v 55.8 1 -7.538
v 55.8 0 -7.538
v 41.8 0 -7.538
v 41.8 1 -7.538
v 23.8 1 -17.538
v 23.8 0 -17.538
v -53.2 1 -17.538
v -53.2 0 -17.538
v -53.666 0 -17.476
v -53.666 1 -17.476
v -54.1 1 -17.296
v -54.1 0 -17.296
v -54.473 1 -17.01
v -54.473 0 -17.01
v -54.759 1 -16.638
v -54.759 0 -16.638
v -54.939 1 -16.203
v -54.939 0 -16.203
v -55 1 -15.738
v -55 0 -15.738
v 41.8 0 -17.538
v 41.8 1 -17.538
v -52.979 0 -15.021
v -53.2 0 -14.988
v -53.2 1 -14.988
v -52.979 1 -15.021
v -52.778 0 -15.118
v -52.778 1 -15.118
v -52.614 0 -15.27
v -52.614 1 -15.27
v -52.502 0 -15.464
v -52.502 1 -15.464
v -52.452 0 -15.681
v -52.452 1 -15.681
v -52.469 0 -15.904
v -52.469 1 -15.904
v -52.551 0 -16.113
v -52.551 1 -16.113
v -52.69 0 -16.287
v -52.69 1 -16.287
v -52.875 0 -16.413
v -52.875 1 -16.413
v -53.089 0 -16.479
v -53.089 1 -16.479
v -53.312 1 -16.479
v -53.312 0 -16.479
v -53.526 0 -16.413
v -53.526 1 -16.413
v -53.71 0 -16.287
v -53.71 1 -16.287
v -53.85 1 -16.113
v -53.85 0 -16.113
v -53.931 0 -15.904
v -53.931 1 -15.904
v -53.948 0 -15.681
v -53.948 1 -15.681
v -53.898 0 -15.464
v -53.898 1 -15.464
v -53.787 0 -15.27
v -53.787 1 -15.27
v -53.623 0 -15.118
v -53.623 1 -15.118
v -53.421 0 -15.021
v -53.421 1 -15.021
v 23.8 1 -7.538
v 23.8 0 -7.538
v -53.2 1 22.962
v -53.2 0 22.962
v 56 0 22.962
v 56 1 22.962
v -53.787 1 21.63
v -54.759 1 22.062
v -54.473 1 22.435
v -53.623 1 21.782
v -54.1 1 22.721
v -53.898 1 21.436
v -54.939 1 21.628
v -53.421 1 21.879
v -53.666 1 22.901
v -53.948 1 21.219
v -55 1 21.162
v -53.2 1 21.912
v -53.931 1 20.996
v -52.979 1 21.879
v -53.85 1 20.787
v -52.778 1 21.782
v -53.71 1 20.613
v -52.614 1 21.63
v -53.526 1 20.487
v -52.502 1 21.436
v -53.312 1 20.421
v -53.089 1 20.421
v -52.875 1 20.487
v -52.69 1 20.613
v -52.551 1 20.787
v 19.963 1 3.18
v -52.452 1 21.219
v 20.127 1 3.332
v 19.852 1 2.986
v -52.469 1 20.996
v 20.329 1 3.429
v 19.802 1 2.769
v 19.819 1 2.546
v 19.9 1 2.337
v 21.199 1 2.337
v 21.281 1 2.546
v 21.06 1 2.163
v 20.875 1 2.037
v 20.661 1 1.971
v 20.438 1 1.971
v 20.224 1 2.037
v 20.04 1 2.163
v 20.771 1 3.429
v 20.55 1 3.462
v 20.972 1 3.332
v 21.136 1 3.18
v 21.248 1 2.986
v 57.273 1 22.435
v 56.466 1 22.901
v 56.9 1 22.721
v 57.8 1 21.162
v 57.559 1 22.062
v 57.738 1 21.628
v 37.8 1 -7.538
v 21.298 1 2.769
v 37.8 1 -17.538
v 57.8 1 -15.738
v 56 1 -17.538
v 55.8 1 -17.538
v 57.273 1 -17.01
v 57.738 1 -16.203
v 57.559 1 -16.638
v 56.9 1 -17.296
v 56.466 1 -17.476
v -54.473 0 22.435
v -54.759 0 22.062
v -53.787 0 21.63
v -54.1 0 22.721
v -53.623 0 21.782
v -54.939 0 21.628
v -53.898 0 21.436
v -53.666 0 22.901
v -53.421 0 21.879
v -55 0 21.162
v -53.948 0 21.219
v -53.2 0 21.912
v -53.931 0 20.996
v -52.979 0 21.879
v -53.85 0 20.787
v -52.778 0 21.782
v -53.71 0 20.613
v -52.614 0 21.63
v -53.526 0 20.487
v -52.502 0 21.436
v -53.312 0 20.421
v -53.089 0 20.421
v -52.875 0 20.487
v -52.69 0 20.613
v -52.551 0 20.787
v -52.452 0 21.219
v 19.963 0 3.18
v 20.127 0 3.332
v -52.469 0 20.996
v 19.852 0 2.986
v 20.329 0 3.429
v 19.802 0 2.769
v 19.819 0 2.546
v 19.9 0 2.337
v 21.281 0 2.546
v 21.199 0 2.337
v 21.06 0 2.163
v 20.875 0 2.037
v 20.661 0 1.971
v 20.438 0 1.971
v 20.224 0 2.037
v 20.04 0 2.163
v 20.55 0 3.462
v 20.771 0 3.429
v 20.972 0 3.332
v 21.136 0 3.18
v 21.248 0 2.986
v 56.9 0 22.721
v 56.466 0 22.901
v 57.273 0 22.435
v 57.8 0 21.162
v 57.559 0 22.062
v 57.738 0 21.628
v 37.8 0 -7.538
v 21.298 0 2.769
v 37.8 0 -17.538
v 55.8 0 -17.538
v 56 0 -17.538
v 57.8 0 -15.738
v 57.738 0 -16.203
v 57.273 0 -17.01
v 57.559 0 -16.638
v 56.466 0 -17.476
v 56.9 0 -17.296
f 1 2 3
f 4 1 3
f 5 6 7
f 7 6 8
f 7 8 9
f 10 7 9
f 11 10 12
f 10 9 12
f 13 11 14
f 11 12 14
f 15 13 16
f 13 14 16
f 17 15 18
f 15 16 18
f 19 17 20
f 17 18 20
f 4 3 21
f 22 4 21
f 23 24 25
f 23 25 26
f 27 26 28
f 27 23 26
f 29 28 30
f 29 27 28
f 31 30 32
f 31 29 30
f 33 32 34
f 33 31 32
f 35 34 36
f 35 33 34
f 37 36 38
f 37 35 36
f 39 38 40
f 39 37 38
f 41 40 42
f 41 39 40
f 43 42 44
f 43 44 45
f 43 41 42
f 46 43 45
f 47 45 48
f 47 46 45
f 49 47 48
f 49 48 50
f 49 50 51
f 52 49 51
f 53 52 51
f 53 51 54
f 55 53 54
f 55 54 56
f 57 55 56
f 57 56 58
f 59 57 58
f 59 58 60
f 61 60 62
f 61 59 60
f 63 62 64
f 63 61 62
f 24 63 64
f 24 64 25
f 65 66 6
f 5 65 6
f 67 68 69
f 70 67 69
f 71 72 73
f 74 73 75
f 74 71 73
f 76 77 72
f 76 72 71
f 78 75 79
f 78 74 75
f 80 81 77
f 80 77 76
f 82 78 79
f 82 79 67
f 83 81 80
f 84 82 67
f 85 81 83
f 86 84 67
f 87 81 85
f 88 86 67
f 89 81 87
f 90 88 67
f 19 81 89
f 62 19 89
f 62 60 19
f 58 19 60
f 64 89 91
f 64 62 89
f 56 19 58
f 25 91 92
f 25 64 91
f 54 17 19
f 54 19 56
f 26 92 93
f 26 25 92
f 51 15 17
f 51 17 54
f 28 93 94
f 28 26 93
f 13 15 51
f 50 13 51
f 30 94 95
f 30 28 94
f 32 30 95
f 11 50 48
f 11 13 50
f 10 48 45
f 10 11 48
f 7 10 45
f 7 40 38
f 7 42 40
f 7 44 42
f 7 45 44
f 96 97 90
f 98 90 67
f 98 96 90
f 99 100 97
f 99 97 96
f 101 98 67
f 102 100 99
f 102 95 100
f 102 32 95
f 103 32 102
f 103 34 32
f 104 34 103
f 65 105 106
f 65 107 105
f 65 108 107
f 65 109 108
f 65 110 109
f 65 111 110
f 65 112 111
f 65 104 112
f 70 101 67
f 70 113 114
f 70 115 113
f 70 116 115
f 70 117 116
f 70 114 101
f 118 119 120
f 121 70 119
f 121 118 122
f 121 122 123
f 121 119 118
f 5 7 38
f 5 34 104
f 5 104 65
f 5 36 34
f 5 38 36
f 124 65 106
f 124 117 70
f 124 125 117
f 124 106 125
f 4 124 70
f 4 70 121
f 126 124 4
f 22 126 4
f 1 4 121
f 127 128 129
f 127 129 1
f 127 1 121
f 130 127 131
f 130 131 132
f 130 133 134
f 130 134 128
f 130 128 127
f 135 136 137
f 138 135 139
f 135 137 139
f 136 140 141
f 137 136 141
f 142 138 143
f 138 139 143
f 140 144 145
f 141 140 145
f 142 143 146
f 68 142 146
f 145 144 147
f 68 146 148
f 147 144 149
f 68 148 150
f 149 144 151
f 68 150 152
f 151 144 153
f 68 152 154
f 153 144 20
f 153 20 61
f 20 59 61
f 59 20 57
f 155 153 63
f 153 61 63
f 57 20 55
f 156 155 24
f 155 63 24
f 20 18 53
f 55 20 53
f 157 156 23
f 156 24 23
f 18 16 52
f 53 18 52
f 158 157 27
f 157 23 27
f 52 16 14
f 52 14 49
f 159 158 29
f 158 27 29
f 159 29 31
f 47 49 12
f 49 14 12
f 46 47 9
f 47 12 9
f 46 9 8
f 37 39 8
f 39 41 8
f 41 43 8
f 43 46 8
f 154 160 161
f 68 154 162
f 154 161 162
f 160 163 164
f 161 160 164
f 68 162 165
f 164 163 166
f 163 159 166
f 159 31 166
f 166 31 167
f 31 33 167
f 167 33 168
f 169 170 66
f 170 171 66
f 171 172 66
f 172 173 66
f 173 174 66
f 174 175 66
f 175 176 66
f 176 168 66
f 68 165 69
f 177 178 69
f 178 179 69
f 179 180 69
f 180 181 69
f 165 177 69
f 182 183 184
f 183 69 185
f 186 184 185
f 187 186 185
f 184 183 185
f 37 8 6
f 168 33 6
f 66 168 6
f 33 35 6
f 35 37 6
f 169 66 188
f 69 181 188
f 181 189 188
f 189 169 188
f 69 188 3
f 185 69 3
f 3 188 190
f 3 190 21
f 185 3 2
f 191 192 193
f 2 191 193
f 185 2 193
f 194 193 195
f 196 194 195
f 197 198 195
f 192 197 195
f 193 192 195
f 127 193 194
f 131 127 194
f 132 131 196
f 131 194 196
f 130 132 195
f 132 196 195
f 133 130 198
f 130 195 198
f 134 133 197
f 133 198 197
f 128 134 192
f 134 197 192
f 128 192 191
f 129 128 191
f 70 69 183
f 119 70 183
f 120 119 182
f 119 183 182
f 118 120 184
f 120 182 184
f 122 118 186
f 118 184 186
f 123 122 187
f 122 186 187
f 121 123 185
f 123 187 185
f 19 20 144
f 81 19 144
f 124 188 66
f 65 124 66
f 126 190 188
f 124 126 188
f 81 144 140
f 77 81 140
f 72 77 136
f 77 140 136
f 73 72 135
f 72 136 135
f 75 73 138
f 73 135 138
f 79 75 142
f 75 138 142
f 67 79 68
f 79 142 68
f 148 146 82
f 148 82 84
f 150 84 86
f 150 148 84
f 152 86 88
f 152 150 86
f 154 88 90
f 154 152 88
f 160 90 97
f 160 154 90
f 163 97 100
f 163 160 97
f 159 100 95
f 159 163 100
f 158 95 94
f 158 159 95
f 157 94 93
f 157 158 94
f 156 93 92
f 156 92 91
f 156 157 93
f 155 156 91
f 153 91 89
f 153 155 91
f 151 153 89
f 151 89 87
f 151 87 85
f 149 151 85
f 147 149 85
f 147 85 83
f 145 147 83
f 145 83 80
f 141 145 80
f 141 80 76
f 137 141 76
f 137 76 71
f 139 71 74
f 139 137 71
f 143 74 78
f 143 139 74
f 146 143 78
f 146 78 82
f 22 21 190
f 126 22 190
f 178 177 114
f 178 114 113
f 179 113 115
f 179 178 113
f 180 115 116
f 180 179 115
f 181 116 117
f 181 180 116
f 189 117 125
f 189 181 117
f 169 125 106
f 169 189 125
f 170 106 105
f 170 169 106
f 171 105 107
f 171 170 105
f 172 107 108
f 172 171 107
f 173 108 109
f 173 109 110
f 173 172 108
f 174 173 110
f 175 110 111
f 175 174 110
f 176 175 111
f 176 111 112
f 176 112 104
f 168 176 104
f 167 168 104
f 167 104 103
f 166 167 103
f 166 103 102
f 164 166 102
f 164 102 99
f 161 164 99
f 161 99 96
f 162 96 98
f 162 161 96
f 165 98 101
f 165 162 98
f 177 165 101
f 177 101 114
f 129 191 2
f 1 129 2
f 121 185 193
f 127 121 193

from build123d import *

# Parameters (mm, degrees)
SKETCH_1_R      = 0.75
EXTRUDE_2_DEPTH = 1


with BuildPart() as part:
    # 草图1 → 凸台-拉伸2 (new body)
    with BuildSketch(Plane(origin=(0, 0, 0), x_dir=(1, 0, 0), z_dir=(0, 1, 0))):
        with BuildLine():
            Line((23.799708029, 17.537518248), (-53.200291971, 17.537518248))
            ThreePointArc((-53.200291971, 17.537518248), (-54.473084177, 17.010310454), (-55.000291971, 15.737518248))
            Line((-55.000291971, 15.737518248), (-55.000291971, -21.162481752))
            ThreePointArc((-55.000291971, -21.162481752), (-54.473084177, -22.435273958), (-53.200291971, -22.962481752))
            Line((-53.200291971, -22.962481752), (55.999708029, -22.962481752))
            ThreePointArc((55.999708029, -22.962481752), (57.272500235, -22.435273958), (57.799708029, -21.162481752))
            Line((57.799708029, -21.162481752), (57.799708029, 15.737518248))
            ThreePointArc((57.799708029, 15.737518248), (57.272500235, 17.010310454), (55.999708029, 17.537518248))
            Line((55.999708029, 17.537518248), (55.799708029, 17.537518248))
            Line((55.799708029, 17.537518248), (55.799708029, 7.537518248))
            Line((55.799708029, 7.537518248), (41.799708029, 7.537518248))
            Line((41.799708029, 7.537518248), (41.799708029, 17.537518248))
            Line((41.799708029, 17.537518248), (37.799708029, 17.537518248))
            Line((37.799708029, 17.537518248), (37.799708029, 7.537518248))
            Line((37.799708029, 7.537518248), (23.799708029, 7.537518248))
            Line((23.799708029, 7.537518248), (23.799708029, 17.537518248))
        make_face()
        with Locations(Location((-53.200291971, -21.162481752, 0), (0, 0, 270))):
            Circle(SKETCH_1_R, mode=Mode.SUBTRACT)
        with Locations(Location((20.549708029, -2.712481752, 0), (0, 0, 270))):
            Circle(SKETCH_1_R, mode=Mode.SUBTRACT)
        with Locations(Location((-53.200291971, 15.737518248, 0), (0, 0, 270))):
            Circle(SKETCH_1_R, mode=Mode.SUBTRACT)
    extrude(amount=EXTRUDE_2_DEPTH)


solid = part.part
